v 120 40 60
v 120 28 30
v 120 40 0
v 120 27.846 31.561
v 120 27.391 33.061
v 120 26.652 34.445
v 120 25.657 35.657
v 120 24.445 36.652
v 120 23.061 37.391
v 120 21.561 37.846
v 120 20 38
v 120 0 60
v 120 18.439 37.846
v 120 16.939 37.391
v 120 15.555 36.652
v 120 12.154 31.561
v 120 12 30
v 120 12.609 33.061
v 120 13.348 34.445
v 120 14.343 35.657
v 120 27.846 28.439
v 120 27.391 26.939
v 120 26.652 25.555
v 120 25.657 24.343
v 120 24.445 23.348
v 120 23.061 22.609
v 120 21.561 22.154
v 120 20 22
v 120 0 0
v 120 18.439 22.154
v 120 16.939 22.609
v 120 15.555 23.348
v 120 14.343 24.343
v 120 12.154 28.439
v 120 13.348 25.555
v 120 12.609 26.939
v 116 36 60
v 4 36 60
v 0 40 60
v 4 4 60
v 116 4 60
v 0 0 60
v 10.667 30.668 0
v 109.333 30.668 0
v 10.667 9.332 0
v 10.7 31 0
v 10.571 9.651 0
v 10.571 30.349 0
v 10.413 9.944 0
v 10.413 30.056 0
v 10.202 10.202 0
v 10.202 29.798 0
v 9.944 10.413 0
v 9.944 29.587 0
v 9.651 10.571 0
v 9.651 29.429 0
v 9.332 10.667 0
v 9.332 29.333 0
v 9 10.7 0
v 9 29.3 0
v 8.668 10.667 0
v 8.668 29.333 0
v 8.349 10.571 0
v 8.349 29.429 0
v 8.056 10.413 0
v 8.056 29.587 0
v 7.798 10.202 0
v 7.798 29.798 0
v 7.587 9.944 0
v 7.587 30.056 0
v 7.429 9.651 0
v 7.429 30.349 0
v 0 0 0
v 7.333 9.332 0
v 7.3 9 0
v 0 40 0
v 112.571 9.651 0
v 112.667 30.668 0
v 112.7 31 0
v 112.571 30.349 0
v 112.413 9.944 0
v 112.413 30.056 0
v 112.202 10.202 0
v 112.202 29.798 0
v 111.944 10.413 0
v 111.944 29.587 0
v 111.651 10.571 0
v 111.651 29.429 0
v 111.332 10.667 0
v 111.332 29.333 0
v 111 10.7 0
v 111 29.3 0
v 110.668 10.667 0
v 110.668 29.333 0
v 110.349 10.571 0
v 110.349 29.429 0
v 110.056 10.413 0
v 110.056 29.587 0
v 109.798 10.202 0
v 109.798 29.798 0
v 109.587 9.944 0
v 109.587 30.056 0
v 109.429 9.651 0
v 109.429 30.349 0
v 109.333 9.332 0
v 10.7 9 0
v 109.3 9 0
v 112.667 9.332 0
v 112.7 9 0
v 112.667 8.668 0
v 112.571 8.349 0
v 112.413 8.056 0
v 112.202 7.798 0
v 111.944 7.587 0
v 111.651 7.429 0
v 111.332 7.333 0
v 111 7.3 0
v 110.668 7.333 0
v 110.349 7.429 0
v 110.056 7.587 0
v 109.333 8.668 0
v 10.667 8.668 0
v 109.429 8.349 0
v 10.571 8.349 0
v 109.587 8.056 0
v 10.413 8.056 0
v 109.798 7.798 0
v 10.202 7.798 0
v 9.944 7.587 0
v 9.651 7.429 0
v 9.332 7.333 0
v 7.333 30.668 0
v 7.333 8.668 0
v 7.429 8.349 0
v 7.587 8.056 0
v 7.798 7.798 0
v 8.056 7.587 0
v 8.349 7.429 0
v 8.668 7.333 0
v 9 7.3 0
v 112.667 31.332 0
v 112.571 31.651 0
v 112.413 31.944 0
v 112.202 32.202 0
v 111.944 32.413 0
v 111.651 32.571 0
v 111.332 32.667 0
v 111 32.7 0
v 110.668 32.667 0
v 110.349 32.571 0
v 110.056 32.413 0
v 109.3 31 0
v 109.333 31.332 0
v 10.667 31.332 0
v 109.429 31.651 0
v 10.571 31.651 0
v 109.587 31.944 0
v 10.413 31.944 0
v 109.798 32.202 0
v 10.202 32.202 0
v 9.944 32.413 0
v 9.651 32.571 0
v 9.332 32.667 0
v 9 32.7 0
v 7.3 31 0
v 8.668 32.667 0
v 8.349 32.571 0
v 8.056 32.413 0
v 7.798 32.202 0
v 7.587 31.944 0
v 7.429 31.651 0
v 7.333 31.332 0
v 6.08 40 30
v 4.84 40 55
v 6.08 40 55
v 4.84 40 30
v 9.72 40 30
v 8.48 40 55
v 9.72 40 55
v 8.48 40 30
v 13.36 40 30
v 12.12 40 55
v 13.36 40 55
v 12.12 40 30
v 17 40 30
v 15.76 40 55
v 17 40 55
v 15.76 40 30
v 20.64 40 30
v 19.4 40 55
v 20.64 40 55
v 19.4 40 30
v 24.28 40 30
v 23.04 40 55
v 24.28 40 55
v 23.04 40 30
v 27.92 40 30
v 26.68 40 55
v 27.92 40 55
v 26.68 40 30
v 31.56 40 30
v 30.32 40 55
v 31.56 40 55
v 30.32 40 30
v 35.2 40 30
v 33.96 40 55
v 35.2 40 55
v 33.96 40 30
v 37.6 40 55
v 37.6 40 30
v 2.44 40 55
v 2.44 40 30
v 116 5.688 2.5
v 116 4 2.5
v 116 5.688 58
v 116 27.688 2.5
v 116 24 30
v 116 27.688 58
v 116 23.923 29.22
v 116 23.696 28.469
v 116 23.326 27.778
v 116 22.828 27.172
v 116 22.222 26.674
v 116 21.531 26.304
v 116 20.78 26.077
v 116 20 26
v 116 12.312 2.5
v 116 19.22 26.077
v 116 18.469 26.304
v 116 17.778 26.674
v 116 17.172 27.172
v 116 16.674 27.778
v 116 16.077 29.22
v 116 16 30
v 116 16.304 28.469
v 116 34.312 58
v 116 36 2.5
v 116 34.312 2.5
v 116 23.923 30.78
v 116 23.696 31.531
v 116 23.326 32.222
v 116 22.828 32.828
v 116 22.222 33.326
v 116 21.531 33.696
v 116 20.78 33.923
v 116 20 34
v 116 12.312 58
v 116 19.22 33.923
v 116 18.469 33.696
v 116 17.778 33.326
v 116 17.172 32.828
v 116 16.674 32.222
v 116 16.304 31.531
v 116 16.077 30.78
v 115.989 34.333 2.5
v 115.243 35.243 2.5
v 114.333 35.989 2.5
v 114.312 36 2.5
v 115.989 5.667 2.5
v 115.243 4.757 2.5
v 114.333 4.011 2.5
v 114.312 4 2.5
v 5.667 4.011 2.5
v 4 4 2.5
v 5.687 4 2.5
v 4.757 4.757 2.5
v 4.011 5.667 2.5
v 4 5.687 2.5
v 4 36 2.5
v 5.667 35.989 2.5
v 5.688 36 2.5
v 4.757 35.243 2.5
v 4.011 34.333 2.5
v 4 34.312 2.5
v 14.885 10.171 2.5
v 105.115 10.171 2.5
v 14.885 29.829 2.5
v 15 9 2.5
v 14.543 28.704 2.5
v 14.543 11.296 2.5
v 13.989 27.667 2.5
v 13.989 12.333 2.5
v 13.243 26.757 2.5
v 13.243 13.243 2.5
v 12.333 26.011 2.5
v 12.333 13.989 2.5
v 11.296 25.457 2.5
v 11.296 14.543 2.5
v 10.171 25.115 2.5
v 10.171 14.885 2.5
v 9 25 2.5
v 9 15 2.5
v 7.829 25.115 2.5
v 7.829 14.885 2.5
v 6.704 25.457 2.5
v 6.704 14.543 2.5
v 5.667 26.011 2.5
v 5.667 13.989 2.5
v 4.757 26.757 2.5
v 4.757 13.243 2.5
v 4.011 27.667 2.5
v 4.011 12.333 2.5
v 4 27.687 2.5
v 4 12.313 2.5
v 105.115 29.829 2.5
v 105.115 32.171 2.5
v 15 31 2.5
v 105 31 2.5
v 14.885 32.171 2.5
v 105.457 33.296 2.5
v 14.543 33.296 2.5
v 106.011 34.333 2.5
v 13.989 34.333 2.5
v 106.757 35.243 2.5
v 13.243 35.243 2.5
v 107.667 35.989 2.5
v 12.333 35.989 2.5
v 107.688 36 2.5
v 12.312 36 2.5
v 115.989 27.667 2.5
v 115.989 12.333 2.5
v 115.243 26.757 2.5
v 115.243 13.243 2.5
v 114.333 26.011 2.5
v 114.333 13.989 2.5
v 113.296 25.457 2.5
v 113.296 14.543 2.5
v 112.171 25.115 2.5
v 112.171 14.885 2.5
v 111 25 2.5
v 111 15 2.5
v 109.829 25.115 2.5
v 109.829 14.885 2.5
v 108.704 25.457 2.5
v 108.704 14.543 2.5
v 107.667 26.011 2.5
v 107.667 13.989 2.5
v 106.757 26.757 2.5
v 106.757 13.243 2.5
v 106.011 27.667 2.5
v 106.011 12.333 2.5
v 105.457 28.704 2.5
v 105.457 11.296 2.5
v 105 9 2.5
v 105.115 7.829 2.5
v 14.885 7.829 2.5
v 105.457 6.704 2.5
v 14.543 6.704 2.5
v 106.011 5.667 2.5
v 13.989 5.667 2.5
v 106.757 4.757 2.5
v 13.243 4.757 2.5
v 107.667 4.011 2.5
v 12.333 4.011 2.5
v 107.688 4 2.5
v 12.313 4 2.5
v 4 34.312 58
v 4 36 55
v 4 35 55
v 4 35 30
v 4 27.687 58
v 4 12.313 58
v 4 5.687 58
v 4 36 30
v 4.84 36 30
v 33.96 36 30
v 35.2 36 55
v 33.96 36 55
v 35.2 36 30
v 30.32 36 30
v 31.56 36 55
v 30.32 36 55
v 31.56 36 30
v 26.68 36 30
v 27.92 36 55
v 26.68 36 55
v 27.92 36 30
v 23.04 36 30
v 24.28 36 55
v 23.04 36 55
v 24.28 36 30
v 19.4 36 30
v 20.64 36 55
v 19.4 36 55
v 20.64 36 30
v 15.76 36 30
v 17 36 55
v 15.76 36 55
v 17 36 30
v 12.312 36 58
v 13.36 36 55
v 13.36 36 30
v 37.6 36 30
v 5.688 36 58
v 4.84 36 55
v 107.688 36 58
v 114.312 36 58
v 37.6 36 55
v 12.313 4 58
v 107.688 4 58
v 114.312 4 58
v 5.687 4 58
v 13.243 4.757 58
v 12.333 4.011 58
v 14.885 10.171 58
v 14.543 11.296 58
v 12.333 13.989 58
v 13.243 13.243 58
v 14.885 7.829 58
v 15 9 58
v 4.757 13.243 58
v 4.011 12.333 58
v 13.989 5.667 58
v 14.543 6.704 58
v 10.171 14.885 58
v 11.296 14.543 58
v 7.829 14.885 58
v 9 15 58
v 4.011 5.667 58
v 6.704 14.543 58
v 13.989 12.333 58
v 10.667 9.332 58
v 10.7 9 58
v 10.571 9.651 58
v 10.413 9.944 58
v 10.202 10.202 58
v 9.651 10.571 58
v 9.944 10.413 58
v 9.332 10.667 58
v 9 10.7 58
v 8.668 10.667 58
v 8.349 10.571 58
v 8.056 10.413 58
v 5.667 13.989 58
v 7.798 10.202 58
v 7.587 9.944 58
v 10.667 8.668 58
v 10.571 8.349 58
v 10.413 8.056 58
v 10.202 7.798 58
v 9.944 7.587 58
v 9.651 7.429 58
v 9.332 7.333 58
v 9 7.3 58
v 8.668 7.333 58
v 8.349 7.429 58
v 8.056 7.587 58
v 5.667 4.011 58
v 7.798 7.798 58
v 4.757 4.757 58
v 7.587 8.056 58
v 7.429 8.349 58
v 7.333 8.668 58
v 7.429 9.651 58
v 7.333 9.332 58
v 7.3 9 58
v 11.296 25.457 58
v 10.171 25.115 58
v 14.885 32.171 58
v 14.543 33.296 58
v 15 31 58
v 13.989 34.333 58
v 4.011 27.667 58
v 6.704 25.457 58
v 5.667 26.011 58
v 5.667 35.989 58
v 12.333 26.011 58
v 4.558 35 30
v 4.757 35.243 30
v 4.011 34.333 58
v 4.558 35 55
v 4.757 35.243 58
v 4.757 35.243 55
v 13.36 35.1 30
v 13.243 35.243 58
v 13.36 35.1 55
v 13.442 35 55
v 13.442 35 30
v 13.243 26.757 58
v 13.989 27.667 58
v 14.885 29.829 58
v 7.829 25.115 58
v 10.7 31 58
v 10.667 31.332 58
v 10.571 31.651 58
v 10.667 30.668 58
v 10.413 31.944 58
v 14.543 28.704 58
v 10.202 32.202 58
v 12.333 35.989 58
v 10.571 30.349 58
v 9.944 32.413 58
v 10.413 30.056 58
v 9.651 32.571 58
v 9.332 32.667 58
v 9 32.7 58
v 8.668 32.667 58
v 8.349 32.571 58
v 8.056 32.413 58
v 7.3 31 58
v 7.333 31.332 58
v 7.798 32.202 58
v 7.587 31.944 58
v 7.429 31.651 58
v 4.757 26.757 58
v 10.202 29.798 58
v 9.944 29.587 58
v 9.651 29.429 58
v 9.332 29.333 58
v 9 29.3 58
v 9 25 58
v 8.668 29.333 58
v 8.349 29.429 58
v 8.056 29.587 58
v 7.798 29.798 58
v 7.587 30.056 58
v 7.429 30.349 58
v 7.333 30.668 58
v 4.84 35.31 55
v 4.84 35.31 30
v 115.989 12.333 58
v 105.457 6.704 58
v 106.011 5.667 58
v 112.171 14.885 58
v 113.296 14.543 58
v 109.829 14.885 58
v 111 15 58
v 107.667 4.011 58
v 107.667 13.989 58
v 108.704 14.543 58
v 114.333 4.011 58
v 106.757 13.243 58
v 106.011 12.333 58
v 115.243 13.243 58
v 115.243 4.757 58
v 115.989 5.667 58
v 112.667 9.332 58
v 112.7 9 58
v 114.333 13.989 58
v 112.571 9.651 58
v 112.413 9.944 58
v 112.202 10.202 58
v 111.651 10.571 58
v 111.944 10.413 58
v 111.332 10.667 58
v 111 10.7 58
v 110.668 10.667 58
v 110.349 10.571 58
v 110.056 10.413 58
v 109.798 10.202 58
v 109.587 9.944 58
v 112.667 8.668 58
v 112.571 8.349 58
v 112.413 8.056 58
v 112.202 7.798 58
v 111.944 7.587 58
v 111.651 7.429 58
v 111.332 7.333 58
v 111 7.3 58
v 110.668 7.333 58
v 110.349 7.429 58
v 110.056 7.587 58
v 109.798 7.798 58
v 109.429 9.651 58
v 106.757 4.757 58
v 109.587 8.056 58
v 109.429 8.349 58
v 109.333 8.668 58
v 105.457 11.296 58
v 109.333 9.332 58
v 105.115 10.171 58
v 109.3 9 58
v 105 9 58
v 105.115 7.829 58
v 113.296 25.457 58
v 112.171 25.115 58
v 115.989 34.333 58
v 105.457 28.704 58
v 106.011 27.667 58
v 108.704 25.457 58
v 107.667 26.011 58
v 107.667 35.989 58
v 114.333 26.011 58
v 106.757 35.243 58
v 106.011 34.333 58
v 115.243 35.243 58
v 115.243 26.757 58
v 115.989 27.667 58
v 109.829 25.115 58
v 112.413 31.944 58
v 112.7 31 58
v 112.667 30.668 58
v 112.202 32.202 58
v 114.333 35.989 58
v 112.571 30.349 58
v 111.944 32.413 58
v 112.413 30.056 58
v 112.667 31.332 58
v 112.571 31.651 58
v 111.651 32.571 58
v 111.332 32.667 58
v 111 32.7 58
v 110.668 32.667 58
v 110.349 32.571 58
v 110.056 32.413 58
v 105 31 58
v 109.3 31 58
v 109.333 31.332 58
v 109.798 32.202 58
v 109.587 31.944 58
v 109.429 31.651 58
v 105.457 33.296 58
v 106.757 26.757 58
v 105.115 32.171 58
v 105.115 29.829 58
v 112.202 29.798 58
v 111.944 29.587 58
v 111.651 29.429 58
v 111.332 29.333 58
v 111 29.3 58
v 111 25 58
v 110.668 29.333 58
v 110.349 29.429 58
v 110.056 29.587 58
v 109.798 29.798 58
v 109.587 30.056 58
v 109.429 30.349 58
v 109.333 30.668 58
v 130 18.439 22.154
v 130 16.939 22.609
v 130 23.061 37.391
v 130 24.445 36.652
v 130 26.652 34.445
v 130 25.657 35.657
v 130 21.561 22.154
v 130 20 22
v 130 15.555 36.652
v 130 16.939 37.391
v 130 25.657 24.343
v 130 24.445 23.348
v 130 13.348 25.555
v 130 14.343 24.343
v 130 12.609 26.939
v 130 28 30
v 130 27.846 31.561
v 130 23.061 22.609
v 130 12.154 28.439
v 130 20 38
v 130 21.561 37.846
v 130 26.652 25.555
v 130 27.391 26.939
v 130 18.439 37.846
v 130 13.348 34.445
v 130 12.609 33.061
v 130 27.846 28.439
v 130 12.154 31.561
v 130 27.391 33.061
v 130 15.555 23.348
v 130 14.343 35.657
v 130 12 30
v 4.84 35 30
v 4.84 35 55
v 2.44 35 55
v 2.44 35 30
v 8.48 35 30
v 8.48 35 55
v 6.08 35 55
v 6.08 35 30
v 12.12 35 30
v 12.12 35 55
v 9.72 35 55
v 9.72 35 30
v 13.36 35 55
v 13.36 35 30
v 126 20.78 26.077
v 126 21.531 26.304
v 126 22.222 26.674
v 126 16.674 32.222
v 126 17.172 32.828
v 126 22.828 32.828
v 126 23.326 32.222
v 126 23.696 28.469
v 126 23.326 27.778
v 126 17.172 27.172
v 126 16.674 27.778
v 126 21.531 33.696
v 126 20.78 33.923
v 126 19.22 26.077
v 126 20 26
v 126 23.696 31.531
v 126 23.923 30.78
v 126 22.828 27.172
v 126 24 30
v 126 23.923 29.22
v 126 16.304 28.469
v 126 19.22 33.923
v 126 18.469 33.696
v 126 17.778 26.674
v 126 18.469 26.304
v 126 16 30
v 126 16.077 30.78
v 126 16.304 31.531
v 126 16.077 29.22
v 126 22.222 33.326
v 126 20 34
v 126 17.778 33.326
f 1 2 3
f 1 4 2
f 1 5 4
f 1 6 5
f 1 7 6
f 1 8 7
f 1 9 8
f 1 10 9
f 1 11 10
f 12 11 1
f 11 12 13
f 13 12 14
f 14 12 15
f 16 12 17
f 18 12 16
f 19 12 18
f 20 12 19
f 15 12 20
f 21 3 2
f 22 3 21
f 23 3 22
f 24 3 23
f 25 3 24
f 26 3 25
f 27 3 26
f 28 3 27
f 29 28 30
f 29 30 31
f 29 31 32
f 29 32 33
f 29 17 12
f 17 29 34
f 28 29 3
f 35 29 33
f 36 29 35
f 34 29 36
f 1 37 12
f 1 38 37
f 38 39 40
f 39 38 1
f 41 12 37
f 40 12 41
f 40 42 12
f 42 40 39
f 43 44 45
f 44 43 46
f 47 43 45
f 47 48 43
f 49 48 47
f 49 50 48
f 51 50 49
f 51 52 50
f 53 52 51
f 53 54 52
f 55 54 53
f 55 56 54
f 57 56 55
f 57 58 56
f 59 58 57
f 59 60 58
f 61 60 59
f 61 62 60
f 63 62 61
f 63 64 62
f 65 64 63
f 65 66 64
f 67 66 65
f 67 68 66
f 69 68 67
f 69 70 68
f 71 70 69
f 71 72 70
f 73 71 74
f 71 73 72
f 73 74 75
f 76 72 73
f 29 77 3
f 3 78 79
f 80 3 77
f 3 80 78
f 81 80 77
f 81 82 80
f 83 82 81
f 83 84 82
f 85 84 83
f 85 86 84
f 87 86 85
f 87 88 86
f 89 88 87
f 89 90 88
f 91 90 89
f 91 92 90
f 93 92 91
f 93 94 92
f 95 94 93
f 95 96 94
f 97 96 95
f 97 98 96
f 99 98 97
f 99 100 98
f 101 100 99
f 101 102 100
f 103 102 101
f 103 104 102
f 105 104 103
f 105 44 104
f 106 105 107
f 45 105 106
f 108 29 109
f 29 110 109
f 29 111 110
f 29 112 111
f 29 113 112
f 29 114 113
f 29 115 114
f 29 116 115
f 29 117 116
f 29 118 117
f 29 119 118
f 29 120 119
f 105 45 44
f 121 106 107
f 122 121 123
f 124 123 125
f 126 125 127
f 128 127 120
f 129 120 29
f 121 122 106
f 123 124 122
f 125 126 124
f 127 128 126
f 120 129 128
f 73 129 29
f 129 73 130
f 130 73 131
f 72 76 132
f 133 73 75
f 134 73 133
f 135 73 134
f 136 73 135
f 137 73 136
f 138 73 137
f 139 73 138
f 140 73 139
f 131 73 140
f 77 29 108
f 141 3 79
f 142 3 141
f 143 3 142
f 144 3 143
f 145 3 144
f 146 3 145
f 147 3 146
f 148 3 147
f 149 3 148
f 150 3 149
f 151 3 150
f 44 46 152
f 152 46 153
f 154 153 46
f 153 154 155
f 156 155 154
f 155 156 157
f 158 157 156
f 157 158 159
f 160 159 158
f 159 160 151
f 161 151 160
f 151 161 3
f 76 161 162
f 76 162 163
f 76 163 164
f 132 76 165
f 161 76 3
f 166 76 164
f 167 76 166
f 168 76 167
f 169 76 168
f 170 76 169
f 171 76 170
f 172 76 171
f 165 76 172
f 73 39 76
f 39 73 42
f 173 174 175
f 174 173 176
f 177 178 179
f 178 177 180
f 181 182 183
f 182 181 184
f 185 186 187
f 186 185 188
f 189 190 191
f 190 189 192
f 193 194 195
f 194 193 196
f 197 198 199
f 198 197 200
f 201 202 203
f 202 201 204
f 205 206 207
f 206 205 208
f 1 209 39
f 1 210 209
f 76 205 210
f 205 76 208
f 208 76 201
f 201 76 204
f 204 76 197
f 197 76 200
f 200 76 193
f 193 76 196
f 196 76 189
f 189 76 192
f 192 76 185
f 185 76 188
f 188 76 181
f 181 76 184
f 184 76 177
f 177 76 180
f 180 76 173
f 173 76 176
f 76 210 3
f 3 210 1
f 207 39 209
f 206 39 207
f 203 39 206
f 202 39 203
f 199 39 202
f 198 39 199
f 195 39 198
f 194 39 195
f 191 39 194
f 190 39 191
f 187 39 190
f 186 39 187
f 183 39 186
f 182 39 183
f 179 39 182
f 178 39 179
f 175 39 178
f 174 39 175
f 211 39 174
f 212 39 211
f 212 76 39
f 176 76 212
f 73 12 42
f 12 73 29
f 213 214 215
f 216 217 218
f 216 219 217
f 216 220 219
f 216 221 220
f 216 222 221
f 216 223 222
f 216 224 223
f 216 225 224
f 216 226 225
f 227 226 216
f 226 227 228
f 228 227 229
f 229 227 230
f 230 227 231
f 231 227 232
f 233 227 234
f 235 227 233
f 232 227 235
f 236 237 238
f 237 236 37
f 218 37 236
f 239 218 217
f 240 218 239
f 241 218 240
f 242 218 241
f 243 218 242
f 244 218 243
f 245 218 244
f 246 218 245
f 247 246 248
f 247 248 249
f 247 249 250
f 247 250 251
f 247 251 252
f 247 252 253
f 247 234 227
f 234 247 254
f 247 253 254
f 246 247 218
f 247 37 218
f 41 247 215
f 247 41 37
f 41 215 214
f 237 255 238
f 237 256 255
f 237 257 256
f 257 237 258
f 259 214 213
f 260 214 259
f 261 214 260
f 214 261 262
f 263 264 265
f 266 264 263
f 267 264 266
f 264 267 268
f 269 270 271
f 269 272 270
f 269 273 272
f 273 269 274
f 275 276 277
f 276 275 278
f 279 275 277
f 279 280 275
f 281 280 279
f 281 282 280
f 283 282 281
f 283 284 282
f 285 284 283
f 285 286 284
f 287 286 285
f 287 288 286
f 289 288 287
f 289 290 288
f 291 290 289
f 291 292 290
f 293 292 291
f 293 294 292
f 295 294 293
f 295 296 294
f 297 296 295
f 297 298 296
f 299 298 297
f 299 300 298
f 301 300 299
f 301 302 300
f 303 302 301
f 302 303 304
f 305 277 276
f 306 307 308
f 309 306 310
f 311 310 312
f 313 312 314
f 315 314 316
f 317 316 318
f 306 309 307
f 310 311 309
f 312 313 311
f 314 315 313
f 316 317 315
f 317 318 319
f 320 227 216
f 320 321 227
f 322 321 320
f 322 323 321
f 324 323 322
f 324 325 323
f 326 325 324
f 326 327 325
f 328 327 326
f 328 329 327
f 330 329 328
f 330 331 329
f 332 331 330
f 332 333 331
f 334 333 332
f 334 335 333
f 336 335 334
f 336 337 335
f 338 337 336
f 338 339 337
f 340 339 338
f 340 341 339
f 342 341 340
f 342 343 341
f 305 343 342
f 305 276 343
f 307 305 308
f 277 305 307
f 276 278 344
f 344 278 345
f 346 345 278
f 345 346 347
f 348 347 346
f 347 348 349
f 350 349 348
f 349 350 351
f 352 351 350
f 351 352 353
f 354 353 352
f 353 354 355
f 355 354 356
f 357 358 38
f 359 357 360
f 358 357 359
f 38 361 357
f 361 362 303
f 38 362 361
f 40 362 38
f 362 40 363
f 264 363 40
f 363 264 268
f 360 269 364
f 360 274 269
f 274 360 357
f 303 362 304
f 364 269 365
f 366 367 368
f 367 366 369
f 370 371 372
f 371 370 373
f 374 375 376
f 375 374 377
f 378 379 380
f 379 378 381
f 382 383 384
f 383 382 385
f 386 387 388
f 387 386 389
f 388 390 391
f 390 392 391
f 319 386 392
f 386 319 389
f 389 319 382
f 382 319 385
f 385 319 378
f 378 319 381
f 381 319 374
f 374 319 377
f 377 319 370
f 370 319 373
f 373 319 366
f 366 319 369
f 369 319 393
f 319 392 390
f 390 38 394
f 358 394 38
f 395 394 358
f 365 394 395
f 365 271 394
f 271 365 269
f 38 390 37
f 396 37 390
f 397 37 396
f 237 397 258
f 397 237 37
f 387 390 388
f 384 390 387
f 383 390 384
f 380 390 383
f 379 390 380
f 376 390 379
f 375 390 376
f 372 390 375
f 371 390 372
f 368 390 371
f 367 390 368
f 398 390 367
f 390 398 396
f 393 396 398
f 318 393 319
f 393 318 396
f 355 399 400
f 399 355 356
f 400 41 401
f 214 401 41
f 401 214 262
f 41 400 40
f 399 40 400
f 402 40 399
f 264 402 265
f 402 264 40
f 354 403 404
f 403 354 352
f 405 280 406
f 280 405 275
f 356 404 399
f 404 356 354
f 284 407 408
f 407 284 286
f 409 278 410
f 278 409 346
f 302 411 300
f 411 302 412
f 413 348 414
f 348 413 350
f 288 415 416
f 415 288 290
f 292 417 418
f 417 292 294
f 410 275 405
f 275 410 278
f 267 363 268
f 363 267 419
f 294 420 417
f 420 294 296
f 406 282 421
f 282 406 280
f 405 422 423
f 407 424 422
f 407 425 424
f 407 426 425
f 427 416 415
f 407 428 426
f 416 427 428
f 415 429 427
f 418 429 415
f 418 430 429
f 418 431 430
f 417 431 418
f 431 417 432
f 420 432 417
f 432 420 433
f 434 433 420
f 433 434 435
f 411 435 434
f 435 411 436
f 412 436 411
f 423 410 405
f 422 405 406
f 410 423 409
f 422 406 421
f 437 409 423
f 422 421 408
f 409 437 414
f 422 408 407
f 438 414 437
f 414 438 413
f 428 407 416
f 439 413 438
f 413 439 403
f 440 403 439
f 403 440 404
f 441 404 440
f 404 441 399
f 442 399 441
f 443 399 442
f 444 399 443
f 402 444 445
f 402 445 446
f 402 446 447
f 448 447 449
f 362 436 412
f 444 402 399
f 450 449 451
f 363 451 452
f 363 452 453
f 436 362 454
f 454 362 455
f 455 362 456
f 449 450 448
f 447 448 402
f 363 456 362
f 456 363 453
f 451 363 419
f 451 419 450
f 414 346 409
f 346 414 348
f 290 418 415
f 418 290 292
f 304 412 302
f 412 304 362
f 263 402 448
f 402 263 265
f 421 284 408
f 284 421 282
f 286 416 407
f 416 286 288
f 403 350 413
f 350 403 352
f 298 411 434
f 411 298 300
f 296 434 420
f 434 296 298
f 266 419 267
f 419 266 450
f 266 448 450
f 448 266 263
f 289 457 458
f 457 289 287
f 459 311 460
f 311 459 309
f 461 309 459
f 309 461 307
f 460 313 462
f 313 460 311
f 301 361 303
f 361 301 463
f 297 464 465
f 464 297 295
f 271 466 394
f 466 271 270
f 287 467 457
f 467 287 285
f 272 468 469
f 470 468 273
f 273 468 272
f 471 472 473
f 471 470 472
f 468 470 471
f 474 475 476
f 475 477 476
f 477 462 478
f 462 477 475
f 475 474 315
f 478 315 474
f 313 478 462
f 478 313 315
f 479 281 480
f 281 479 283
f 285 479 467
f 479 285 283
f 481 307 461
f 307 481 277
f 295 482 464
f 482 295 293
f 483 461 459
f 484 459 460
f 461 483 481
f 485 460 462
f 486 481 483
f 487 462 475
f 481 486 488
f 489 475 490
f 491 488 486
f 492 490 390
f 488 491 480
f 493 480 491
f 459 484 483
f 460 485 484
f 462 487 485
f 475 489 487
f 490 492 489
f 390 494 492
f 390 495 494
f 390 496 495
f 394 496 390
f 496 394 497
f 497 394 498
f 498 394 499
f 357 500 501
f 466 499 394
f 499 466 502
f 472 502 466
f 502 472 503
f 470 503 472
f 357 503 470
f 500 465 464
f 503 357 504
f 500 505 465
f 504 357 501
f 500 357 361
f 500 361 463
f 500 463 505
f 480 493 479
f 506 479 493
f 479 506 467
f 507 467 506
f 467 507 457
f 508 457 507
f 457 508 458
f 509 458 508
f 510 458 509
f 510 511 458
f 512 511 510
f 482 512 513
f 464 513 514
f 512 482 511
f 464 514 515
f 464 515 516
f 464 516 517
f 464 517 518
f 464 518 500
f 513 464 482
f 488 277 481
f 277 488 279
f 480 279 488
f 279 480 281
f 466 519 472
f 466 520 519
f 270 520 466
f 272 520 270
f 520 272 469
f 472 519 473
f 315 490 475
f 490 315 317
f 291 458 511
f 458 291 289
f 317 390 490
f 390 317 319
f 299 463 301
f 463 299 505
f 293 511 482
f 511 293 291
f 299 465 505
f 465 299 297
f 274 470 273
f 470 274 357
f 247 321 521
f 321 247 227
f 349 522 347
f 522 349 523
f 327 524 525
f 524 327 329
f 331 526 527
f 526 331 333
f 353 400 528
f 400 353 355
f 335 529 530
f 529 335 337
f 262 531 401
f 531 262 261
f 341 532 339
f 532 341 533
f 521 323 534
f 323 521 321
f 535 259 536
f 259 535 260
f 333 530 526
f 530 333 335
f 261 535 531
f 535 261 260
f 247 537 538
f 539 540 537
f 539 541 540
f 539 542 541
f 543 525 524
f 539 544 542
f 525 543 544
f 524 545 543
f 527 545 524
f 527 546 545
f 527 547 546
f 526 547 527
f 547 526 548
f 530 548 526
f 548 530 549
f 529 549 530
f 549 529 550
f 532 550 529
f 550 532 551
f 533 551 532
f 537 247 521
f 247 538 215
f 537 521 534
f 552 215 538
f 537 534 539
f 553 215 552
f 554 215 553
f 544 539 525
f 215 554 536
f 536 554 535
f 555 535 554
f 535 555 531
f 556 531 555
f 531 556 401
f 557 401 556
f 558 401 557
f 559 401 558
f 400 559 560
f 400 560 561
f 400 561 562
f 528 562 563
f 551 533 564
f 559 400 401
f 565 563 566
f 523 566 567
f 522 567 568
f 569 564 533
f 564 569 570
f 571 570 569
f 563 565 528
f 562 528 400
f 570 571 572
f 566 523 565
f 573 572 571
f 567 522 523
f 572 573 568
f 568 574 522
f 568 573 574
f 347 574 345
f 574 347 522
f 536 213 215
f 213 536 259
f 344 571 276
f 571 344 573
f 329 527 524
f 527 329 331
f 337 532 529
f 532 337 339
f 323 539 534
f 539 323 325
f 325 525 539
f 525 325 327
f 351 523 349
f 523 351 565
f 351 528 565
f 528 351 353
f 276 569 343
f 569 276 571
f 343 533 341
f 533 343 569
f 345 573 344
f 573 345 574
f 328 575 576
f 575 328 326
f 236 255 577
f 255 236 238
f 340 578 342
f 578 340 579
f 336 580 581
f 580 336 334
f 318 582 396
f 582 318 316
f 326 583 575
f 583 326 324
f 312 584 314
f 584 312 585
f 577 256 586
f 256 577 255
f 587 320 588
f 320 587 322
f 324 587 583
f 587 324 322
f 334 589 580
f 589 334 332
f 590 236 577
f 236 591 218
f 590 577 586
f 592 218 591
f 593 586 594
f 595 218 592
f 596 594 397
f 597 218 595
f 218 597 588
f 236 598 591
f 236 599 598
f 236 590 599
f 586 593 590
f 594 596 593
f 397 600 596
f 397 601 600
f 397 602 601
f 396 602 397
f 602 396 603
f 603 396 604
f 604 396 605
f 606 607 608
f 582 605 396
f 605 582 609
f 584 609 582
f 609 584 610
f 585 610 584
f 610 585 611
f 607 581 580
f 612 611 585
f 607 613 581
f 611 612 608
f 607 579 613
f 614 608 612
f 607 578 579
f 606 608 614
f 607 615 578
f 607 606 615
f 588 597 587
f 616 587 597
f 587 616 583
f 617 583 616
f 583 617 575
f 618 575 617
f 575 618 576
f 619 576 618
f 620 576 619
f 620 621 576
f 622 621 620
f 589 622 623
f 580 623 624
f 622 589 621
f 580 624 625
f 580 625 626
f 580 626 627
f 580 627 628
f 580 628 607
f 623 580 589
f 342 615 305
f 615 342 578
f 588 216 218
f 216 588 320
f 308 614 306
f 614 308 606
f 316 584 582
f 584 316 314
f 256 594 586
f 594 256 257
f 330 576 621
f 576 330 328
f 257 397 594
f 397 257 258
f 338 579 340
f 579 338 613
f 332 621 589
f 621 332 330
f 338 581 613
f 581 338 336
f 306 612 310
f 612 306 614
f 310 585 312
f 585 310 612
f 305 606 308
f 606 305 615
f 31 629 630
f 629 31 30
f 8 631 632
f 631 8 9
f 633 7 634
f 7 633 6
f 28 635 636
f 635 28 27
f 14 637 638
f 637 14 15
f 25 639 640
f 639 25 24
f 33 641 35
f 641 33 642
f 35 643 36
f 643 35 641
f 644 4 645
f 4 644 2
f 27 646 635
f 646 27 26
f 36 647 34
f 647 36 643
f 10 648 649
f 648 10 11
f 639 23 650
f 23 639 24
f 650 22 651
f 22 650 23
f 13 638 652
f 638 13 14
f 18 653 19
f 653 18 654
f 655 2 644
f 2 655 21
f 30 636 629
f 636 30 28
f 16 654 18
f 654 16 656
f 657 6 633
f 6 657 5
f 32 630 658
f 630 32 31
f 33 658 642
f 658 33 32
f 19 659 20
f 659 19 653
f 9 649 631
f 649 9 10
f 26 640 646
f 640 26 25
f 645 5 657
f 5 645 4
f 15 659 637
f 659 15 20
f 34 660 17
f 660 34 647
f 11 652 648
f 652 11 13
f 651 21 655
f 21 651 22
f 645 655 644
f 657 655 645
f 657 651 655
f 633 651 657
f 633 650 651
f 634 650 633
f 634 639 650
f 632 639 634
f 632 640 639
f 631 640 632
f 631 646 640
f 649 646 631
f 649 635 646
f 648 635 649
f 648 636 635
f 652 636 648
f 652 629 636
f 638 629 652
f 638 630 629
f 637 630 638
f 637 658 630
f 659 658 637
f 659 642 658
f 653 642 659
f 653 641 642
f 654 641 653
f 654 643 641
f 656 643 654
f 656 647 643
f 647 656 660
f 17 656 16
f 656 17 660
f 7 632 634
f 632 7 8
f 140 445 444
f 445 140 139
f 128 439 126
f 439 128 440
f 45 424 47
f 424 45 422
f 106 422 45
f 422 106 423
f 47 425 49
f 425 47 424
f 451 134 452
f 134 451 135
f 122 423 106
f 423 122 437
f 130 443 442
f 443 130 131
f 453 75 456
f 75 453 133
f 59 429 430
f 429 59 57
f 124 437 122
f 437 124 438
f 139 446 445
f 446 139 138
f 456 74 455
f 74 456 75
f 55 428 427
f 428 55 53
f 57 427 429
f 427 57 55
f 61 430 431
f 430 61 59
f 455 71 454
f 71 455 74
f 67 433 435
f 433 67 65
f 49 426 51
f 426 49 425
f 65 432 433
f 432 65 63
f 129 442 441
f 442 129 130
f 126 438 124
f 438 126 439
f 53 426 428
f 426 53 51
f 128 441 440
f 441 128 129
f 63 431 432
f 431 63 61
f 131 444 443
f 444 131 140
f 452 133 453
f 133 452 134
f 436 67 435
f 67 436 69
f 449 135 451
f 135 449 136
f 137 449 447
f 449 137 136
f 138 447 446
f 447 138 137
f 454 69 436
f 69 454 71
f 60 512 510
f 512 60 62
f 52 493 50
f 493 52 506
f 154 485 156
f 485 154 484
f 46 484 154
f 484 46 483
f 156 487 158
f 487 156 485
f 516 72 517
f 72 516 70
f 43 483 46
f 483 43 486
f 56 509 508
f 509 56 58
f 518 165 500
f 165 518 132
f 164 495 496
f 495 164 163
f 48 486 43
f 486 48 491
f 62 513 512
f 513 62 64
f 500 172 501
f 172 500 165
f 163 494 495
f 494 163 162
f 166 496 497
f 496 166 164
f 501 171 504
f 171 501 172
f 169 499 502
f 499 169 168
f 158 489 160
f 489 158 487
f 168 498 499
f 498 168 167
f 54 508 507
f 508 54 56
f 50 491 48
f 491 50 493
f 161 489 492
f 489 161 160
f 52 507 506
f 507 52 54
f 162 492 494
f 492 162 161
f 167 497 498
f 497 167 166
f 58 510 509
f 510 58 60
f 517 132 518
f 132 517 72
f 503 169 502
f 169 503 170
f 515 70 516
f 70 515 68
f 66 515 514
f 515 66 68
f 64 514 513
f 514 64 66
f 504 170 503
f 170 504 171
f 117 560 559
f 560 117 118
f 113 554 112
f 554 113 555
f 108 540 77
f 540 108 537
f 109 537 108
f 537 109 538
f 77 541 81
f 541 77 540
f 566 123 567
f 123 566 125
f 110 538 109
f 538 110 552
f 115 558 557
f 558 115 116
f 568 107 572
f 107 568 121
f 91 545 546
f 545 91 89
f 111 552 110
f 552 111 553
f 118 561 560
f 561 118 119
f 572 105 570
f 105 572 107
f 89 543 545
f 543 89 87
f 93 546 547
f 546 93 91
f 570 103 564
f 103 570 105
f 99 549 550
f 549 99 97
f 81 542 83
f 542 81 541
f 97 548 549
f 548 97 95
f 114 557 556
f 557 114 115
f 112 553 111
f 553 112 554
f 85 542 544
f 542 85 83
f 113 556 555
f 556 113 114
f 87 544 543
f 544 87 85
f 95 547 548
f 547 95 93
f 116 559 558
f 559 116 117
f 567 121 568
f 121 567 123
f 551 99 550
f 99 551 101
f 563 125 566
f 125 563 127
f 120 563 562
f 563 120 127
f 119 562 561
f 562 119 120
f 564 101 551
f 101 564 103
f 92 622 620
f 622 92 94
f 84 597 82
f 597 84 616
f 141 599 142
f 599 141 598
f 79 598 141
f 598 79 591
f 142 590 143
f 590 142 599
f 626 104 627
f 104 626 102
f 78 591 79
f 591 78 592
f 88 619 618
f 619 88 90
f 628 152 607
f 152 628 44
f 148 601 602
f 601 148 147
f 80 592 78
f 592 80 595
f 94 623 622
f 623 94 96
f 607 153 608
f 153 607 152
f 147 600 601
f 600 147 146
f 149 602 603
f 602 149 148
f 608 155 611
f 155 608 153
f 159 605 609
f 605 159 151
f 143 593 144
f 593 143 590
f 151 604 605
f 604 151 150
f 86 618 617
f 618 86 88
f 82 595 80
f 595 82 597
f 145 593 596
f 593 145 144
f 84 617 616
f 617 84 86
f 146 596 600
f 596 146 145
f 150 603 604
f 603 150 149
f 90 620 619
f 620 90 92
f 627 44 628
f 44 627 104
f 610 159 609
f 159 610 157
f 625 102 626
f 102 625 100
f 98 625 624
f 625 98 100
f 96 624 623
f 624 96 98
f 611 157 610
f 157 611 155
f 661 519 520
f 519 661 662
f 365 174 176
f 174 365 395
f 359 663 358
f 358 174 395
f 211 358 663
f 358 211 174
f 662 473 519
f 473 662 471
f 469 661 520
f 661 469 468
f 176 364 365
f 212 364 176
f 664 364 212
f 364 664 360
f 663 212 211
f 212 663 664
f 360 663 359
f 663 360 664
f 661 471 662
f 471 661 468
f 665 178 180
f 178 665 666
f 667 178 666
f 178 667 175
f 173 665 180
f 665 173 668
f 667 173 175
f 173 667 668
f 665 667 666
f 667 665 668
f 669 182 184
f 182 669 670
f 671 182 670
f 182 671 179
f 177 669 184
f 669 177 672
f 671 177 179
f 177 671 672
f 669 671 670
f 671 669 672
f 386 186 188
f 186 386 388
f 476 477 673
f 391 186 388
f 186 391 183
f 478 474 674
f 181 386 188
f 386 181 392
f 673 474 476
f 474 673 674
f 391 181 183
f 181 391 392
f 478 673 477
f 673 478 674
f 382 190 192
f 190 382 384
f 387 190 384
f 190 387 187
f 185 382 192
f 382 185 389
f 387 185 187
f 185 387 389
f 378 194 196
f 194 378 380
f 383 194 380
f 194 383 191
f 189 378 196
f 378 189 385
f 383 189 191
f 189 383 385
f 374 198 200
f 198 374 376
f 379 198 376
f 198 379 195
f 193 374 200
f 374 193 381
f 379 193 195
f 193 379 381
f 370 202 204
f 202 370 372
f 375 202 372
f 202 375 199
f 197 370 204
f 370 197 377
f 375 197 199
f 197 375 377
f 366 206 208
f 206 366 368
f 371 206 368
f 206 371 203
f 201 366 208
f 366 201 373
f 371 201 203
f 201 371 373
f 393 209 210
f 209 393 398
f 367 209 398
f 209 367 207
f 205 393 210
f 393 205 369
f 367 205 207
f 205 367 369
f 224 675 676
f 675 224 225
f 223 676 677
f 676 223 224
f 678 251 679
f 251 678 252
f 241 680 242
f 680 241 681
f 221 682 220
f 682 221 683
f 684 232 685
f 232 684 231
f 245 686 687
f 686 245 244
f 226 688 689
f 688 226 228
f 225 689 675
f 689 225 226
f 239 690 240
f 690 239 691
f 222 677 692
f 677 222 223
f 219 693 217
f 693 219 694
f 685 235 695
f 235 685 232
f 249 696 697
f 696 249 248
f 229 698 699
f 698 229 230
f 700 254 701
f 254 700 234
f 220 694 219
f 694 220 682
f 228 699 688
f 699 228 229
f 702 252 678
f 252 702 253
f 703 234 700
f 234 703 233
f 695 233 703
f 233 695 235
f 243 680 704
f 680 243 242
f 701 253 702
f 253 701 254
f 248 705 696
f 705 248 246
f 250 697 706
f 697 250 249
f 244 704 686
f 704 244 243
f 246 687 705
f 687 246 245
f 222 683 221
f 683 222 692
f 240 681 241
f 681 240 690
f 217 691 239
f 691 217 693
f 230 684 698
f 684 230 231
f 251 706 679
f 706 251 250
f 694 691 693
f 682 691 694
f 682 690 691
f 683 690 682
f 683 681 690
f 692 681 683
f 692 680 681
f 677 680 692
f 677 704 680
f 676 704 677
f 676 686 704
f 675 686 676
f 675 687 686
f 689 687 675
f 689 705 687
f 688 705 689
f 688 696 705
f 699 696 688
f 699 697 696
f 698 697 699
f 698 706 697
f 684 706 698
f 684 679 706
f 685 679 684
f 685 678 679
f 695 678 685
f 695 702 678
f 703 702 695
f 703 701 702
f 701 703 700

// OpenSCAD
$fn = 32;

// ----------------------------------------------------------------------
// Enclosure body: 120 x 40 x 60 mm, wall 4 mm
// ----------------------------------------------------------------------

// --- parameters (mm) ---
length = 120;             // outside length, X
width = 40;               // outside width, Y
height = 60;              // outside height, Z
wall = 4;                 // side wall thickness
floor_t = 2.5;            // floor thickness
boss_d = 12;              // corner boss diameter
boss_h = 55.5;            // corner boss height above the floor
boss_hole_d = 3.4;        // lid screw clearance in the boss
boss_lip = 9;             // boss centre inset from the corner
vent_slots = 10;          // vent slots in the long wall
vent_w = 2.4;             // vent slot width
vent_h = 25;              // vent slot height
vent_pitch = 3.64;        // vent slot pitch
vent_z = 30;              // vent slot sill height
nipple_d = 16;            // cable gland boss diameter
nipple_h = 10;            // cable gland boss height
nipple_bore = 8;          // cable gland bore

module shell() {
  difference() {
    cube([length, width, height]);
    /* hollow, open at the top */
    translate([wall, wall, floor_t])
      cube([length - 2 * wall, width - 2 * wall, height]);
  }
}

module bosses() {
  /* corner bosses, sunk 1 mm into the floor */
  for (sx = [0, 1]) for (sy = [0, 1])
    translate([sx * (length - 2 * boss_lip) + boss_lip, sy * (width - 2 * boss_lip) + boss_lip, floor_t - 1])
      cylinder(h = boss_h + 1, d = boss_d);
}

module gland() {
  /* boss on the short wall, sunk 1 mm into it */
  translate([length - 1, width / 2, height * 0.5]) rotate([0, 90, 0])
    cylinder(h = nipple_h + 1, d = nipple_d);
}

difference() {
  union() {
    shell();
    bosses();
    gland();
  }
  /* boss screw holes */
  for (sx = [0, 1]) for (sy = [0, 1])
    translate([sx * (length - 2 * boss_lip) + boss_lip, sy * (width - 2 * boss_lip) + boss_lip, -1]) cylinder(h = floor_t + boss_h + 2, d = boss_hole_d);
  /* vent grille in the +Y wall */
  for (i = [0 : vent_slots - 1]) translate([vent_pitch * (i + 1) - vent_w / 2, width - wall - 1, vent_z]) cube([vent_w, wall + 2, vent_h]);
  translate([length, width / 2, height * 0.5]) rotate([0, 90, 0]) translate([0, 0, -nipple_h - 2]) cylinder(h = nipple_h + wall + 4, d = nipple_bore);
}
